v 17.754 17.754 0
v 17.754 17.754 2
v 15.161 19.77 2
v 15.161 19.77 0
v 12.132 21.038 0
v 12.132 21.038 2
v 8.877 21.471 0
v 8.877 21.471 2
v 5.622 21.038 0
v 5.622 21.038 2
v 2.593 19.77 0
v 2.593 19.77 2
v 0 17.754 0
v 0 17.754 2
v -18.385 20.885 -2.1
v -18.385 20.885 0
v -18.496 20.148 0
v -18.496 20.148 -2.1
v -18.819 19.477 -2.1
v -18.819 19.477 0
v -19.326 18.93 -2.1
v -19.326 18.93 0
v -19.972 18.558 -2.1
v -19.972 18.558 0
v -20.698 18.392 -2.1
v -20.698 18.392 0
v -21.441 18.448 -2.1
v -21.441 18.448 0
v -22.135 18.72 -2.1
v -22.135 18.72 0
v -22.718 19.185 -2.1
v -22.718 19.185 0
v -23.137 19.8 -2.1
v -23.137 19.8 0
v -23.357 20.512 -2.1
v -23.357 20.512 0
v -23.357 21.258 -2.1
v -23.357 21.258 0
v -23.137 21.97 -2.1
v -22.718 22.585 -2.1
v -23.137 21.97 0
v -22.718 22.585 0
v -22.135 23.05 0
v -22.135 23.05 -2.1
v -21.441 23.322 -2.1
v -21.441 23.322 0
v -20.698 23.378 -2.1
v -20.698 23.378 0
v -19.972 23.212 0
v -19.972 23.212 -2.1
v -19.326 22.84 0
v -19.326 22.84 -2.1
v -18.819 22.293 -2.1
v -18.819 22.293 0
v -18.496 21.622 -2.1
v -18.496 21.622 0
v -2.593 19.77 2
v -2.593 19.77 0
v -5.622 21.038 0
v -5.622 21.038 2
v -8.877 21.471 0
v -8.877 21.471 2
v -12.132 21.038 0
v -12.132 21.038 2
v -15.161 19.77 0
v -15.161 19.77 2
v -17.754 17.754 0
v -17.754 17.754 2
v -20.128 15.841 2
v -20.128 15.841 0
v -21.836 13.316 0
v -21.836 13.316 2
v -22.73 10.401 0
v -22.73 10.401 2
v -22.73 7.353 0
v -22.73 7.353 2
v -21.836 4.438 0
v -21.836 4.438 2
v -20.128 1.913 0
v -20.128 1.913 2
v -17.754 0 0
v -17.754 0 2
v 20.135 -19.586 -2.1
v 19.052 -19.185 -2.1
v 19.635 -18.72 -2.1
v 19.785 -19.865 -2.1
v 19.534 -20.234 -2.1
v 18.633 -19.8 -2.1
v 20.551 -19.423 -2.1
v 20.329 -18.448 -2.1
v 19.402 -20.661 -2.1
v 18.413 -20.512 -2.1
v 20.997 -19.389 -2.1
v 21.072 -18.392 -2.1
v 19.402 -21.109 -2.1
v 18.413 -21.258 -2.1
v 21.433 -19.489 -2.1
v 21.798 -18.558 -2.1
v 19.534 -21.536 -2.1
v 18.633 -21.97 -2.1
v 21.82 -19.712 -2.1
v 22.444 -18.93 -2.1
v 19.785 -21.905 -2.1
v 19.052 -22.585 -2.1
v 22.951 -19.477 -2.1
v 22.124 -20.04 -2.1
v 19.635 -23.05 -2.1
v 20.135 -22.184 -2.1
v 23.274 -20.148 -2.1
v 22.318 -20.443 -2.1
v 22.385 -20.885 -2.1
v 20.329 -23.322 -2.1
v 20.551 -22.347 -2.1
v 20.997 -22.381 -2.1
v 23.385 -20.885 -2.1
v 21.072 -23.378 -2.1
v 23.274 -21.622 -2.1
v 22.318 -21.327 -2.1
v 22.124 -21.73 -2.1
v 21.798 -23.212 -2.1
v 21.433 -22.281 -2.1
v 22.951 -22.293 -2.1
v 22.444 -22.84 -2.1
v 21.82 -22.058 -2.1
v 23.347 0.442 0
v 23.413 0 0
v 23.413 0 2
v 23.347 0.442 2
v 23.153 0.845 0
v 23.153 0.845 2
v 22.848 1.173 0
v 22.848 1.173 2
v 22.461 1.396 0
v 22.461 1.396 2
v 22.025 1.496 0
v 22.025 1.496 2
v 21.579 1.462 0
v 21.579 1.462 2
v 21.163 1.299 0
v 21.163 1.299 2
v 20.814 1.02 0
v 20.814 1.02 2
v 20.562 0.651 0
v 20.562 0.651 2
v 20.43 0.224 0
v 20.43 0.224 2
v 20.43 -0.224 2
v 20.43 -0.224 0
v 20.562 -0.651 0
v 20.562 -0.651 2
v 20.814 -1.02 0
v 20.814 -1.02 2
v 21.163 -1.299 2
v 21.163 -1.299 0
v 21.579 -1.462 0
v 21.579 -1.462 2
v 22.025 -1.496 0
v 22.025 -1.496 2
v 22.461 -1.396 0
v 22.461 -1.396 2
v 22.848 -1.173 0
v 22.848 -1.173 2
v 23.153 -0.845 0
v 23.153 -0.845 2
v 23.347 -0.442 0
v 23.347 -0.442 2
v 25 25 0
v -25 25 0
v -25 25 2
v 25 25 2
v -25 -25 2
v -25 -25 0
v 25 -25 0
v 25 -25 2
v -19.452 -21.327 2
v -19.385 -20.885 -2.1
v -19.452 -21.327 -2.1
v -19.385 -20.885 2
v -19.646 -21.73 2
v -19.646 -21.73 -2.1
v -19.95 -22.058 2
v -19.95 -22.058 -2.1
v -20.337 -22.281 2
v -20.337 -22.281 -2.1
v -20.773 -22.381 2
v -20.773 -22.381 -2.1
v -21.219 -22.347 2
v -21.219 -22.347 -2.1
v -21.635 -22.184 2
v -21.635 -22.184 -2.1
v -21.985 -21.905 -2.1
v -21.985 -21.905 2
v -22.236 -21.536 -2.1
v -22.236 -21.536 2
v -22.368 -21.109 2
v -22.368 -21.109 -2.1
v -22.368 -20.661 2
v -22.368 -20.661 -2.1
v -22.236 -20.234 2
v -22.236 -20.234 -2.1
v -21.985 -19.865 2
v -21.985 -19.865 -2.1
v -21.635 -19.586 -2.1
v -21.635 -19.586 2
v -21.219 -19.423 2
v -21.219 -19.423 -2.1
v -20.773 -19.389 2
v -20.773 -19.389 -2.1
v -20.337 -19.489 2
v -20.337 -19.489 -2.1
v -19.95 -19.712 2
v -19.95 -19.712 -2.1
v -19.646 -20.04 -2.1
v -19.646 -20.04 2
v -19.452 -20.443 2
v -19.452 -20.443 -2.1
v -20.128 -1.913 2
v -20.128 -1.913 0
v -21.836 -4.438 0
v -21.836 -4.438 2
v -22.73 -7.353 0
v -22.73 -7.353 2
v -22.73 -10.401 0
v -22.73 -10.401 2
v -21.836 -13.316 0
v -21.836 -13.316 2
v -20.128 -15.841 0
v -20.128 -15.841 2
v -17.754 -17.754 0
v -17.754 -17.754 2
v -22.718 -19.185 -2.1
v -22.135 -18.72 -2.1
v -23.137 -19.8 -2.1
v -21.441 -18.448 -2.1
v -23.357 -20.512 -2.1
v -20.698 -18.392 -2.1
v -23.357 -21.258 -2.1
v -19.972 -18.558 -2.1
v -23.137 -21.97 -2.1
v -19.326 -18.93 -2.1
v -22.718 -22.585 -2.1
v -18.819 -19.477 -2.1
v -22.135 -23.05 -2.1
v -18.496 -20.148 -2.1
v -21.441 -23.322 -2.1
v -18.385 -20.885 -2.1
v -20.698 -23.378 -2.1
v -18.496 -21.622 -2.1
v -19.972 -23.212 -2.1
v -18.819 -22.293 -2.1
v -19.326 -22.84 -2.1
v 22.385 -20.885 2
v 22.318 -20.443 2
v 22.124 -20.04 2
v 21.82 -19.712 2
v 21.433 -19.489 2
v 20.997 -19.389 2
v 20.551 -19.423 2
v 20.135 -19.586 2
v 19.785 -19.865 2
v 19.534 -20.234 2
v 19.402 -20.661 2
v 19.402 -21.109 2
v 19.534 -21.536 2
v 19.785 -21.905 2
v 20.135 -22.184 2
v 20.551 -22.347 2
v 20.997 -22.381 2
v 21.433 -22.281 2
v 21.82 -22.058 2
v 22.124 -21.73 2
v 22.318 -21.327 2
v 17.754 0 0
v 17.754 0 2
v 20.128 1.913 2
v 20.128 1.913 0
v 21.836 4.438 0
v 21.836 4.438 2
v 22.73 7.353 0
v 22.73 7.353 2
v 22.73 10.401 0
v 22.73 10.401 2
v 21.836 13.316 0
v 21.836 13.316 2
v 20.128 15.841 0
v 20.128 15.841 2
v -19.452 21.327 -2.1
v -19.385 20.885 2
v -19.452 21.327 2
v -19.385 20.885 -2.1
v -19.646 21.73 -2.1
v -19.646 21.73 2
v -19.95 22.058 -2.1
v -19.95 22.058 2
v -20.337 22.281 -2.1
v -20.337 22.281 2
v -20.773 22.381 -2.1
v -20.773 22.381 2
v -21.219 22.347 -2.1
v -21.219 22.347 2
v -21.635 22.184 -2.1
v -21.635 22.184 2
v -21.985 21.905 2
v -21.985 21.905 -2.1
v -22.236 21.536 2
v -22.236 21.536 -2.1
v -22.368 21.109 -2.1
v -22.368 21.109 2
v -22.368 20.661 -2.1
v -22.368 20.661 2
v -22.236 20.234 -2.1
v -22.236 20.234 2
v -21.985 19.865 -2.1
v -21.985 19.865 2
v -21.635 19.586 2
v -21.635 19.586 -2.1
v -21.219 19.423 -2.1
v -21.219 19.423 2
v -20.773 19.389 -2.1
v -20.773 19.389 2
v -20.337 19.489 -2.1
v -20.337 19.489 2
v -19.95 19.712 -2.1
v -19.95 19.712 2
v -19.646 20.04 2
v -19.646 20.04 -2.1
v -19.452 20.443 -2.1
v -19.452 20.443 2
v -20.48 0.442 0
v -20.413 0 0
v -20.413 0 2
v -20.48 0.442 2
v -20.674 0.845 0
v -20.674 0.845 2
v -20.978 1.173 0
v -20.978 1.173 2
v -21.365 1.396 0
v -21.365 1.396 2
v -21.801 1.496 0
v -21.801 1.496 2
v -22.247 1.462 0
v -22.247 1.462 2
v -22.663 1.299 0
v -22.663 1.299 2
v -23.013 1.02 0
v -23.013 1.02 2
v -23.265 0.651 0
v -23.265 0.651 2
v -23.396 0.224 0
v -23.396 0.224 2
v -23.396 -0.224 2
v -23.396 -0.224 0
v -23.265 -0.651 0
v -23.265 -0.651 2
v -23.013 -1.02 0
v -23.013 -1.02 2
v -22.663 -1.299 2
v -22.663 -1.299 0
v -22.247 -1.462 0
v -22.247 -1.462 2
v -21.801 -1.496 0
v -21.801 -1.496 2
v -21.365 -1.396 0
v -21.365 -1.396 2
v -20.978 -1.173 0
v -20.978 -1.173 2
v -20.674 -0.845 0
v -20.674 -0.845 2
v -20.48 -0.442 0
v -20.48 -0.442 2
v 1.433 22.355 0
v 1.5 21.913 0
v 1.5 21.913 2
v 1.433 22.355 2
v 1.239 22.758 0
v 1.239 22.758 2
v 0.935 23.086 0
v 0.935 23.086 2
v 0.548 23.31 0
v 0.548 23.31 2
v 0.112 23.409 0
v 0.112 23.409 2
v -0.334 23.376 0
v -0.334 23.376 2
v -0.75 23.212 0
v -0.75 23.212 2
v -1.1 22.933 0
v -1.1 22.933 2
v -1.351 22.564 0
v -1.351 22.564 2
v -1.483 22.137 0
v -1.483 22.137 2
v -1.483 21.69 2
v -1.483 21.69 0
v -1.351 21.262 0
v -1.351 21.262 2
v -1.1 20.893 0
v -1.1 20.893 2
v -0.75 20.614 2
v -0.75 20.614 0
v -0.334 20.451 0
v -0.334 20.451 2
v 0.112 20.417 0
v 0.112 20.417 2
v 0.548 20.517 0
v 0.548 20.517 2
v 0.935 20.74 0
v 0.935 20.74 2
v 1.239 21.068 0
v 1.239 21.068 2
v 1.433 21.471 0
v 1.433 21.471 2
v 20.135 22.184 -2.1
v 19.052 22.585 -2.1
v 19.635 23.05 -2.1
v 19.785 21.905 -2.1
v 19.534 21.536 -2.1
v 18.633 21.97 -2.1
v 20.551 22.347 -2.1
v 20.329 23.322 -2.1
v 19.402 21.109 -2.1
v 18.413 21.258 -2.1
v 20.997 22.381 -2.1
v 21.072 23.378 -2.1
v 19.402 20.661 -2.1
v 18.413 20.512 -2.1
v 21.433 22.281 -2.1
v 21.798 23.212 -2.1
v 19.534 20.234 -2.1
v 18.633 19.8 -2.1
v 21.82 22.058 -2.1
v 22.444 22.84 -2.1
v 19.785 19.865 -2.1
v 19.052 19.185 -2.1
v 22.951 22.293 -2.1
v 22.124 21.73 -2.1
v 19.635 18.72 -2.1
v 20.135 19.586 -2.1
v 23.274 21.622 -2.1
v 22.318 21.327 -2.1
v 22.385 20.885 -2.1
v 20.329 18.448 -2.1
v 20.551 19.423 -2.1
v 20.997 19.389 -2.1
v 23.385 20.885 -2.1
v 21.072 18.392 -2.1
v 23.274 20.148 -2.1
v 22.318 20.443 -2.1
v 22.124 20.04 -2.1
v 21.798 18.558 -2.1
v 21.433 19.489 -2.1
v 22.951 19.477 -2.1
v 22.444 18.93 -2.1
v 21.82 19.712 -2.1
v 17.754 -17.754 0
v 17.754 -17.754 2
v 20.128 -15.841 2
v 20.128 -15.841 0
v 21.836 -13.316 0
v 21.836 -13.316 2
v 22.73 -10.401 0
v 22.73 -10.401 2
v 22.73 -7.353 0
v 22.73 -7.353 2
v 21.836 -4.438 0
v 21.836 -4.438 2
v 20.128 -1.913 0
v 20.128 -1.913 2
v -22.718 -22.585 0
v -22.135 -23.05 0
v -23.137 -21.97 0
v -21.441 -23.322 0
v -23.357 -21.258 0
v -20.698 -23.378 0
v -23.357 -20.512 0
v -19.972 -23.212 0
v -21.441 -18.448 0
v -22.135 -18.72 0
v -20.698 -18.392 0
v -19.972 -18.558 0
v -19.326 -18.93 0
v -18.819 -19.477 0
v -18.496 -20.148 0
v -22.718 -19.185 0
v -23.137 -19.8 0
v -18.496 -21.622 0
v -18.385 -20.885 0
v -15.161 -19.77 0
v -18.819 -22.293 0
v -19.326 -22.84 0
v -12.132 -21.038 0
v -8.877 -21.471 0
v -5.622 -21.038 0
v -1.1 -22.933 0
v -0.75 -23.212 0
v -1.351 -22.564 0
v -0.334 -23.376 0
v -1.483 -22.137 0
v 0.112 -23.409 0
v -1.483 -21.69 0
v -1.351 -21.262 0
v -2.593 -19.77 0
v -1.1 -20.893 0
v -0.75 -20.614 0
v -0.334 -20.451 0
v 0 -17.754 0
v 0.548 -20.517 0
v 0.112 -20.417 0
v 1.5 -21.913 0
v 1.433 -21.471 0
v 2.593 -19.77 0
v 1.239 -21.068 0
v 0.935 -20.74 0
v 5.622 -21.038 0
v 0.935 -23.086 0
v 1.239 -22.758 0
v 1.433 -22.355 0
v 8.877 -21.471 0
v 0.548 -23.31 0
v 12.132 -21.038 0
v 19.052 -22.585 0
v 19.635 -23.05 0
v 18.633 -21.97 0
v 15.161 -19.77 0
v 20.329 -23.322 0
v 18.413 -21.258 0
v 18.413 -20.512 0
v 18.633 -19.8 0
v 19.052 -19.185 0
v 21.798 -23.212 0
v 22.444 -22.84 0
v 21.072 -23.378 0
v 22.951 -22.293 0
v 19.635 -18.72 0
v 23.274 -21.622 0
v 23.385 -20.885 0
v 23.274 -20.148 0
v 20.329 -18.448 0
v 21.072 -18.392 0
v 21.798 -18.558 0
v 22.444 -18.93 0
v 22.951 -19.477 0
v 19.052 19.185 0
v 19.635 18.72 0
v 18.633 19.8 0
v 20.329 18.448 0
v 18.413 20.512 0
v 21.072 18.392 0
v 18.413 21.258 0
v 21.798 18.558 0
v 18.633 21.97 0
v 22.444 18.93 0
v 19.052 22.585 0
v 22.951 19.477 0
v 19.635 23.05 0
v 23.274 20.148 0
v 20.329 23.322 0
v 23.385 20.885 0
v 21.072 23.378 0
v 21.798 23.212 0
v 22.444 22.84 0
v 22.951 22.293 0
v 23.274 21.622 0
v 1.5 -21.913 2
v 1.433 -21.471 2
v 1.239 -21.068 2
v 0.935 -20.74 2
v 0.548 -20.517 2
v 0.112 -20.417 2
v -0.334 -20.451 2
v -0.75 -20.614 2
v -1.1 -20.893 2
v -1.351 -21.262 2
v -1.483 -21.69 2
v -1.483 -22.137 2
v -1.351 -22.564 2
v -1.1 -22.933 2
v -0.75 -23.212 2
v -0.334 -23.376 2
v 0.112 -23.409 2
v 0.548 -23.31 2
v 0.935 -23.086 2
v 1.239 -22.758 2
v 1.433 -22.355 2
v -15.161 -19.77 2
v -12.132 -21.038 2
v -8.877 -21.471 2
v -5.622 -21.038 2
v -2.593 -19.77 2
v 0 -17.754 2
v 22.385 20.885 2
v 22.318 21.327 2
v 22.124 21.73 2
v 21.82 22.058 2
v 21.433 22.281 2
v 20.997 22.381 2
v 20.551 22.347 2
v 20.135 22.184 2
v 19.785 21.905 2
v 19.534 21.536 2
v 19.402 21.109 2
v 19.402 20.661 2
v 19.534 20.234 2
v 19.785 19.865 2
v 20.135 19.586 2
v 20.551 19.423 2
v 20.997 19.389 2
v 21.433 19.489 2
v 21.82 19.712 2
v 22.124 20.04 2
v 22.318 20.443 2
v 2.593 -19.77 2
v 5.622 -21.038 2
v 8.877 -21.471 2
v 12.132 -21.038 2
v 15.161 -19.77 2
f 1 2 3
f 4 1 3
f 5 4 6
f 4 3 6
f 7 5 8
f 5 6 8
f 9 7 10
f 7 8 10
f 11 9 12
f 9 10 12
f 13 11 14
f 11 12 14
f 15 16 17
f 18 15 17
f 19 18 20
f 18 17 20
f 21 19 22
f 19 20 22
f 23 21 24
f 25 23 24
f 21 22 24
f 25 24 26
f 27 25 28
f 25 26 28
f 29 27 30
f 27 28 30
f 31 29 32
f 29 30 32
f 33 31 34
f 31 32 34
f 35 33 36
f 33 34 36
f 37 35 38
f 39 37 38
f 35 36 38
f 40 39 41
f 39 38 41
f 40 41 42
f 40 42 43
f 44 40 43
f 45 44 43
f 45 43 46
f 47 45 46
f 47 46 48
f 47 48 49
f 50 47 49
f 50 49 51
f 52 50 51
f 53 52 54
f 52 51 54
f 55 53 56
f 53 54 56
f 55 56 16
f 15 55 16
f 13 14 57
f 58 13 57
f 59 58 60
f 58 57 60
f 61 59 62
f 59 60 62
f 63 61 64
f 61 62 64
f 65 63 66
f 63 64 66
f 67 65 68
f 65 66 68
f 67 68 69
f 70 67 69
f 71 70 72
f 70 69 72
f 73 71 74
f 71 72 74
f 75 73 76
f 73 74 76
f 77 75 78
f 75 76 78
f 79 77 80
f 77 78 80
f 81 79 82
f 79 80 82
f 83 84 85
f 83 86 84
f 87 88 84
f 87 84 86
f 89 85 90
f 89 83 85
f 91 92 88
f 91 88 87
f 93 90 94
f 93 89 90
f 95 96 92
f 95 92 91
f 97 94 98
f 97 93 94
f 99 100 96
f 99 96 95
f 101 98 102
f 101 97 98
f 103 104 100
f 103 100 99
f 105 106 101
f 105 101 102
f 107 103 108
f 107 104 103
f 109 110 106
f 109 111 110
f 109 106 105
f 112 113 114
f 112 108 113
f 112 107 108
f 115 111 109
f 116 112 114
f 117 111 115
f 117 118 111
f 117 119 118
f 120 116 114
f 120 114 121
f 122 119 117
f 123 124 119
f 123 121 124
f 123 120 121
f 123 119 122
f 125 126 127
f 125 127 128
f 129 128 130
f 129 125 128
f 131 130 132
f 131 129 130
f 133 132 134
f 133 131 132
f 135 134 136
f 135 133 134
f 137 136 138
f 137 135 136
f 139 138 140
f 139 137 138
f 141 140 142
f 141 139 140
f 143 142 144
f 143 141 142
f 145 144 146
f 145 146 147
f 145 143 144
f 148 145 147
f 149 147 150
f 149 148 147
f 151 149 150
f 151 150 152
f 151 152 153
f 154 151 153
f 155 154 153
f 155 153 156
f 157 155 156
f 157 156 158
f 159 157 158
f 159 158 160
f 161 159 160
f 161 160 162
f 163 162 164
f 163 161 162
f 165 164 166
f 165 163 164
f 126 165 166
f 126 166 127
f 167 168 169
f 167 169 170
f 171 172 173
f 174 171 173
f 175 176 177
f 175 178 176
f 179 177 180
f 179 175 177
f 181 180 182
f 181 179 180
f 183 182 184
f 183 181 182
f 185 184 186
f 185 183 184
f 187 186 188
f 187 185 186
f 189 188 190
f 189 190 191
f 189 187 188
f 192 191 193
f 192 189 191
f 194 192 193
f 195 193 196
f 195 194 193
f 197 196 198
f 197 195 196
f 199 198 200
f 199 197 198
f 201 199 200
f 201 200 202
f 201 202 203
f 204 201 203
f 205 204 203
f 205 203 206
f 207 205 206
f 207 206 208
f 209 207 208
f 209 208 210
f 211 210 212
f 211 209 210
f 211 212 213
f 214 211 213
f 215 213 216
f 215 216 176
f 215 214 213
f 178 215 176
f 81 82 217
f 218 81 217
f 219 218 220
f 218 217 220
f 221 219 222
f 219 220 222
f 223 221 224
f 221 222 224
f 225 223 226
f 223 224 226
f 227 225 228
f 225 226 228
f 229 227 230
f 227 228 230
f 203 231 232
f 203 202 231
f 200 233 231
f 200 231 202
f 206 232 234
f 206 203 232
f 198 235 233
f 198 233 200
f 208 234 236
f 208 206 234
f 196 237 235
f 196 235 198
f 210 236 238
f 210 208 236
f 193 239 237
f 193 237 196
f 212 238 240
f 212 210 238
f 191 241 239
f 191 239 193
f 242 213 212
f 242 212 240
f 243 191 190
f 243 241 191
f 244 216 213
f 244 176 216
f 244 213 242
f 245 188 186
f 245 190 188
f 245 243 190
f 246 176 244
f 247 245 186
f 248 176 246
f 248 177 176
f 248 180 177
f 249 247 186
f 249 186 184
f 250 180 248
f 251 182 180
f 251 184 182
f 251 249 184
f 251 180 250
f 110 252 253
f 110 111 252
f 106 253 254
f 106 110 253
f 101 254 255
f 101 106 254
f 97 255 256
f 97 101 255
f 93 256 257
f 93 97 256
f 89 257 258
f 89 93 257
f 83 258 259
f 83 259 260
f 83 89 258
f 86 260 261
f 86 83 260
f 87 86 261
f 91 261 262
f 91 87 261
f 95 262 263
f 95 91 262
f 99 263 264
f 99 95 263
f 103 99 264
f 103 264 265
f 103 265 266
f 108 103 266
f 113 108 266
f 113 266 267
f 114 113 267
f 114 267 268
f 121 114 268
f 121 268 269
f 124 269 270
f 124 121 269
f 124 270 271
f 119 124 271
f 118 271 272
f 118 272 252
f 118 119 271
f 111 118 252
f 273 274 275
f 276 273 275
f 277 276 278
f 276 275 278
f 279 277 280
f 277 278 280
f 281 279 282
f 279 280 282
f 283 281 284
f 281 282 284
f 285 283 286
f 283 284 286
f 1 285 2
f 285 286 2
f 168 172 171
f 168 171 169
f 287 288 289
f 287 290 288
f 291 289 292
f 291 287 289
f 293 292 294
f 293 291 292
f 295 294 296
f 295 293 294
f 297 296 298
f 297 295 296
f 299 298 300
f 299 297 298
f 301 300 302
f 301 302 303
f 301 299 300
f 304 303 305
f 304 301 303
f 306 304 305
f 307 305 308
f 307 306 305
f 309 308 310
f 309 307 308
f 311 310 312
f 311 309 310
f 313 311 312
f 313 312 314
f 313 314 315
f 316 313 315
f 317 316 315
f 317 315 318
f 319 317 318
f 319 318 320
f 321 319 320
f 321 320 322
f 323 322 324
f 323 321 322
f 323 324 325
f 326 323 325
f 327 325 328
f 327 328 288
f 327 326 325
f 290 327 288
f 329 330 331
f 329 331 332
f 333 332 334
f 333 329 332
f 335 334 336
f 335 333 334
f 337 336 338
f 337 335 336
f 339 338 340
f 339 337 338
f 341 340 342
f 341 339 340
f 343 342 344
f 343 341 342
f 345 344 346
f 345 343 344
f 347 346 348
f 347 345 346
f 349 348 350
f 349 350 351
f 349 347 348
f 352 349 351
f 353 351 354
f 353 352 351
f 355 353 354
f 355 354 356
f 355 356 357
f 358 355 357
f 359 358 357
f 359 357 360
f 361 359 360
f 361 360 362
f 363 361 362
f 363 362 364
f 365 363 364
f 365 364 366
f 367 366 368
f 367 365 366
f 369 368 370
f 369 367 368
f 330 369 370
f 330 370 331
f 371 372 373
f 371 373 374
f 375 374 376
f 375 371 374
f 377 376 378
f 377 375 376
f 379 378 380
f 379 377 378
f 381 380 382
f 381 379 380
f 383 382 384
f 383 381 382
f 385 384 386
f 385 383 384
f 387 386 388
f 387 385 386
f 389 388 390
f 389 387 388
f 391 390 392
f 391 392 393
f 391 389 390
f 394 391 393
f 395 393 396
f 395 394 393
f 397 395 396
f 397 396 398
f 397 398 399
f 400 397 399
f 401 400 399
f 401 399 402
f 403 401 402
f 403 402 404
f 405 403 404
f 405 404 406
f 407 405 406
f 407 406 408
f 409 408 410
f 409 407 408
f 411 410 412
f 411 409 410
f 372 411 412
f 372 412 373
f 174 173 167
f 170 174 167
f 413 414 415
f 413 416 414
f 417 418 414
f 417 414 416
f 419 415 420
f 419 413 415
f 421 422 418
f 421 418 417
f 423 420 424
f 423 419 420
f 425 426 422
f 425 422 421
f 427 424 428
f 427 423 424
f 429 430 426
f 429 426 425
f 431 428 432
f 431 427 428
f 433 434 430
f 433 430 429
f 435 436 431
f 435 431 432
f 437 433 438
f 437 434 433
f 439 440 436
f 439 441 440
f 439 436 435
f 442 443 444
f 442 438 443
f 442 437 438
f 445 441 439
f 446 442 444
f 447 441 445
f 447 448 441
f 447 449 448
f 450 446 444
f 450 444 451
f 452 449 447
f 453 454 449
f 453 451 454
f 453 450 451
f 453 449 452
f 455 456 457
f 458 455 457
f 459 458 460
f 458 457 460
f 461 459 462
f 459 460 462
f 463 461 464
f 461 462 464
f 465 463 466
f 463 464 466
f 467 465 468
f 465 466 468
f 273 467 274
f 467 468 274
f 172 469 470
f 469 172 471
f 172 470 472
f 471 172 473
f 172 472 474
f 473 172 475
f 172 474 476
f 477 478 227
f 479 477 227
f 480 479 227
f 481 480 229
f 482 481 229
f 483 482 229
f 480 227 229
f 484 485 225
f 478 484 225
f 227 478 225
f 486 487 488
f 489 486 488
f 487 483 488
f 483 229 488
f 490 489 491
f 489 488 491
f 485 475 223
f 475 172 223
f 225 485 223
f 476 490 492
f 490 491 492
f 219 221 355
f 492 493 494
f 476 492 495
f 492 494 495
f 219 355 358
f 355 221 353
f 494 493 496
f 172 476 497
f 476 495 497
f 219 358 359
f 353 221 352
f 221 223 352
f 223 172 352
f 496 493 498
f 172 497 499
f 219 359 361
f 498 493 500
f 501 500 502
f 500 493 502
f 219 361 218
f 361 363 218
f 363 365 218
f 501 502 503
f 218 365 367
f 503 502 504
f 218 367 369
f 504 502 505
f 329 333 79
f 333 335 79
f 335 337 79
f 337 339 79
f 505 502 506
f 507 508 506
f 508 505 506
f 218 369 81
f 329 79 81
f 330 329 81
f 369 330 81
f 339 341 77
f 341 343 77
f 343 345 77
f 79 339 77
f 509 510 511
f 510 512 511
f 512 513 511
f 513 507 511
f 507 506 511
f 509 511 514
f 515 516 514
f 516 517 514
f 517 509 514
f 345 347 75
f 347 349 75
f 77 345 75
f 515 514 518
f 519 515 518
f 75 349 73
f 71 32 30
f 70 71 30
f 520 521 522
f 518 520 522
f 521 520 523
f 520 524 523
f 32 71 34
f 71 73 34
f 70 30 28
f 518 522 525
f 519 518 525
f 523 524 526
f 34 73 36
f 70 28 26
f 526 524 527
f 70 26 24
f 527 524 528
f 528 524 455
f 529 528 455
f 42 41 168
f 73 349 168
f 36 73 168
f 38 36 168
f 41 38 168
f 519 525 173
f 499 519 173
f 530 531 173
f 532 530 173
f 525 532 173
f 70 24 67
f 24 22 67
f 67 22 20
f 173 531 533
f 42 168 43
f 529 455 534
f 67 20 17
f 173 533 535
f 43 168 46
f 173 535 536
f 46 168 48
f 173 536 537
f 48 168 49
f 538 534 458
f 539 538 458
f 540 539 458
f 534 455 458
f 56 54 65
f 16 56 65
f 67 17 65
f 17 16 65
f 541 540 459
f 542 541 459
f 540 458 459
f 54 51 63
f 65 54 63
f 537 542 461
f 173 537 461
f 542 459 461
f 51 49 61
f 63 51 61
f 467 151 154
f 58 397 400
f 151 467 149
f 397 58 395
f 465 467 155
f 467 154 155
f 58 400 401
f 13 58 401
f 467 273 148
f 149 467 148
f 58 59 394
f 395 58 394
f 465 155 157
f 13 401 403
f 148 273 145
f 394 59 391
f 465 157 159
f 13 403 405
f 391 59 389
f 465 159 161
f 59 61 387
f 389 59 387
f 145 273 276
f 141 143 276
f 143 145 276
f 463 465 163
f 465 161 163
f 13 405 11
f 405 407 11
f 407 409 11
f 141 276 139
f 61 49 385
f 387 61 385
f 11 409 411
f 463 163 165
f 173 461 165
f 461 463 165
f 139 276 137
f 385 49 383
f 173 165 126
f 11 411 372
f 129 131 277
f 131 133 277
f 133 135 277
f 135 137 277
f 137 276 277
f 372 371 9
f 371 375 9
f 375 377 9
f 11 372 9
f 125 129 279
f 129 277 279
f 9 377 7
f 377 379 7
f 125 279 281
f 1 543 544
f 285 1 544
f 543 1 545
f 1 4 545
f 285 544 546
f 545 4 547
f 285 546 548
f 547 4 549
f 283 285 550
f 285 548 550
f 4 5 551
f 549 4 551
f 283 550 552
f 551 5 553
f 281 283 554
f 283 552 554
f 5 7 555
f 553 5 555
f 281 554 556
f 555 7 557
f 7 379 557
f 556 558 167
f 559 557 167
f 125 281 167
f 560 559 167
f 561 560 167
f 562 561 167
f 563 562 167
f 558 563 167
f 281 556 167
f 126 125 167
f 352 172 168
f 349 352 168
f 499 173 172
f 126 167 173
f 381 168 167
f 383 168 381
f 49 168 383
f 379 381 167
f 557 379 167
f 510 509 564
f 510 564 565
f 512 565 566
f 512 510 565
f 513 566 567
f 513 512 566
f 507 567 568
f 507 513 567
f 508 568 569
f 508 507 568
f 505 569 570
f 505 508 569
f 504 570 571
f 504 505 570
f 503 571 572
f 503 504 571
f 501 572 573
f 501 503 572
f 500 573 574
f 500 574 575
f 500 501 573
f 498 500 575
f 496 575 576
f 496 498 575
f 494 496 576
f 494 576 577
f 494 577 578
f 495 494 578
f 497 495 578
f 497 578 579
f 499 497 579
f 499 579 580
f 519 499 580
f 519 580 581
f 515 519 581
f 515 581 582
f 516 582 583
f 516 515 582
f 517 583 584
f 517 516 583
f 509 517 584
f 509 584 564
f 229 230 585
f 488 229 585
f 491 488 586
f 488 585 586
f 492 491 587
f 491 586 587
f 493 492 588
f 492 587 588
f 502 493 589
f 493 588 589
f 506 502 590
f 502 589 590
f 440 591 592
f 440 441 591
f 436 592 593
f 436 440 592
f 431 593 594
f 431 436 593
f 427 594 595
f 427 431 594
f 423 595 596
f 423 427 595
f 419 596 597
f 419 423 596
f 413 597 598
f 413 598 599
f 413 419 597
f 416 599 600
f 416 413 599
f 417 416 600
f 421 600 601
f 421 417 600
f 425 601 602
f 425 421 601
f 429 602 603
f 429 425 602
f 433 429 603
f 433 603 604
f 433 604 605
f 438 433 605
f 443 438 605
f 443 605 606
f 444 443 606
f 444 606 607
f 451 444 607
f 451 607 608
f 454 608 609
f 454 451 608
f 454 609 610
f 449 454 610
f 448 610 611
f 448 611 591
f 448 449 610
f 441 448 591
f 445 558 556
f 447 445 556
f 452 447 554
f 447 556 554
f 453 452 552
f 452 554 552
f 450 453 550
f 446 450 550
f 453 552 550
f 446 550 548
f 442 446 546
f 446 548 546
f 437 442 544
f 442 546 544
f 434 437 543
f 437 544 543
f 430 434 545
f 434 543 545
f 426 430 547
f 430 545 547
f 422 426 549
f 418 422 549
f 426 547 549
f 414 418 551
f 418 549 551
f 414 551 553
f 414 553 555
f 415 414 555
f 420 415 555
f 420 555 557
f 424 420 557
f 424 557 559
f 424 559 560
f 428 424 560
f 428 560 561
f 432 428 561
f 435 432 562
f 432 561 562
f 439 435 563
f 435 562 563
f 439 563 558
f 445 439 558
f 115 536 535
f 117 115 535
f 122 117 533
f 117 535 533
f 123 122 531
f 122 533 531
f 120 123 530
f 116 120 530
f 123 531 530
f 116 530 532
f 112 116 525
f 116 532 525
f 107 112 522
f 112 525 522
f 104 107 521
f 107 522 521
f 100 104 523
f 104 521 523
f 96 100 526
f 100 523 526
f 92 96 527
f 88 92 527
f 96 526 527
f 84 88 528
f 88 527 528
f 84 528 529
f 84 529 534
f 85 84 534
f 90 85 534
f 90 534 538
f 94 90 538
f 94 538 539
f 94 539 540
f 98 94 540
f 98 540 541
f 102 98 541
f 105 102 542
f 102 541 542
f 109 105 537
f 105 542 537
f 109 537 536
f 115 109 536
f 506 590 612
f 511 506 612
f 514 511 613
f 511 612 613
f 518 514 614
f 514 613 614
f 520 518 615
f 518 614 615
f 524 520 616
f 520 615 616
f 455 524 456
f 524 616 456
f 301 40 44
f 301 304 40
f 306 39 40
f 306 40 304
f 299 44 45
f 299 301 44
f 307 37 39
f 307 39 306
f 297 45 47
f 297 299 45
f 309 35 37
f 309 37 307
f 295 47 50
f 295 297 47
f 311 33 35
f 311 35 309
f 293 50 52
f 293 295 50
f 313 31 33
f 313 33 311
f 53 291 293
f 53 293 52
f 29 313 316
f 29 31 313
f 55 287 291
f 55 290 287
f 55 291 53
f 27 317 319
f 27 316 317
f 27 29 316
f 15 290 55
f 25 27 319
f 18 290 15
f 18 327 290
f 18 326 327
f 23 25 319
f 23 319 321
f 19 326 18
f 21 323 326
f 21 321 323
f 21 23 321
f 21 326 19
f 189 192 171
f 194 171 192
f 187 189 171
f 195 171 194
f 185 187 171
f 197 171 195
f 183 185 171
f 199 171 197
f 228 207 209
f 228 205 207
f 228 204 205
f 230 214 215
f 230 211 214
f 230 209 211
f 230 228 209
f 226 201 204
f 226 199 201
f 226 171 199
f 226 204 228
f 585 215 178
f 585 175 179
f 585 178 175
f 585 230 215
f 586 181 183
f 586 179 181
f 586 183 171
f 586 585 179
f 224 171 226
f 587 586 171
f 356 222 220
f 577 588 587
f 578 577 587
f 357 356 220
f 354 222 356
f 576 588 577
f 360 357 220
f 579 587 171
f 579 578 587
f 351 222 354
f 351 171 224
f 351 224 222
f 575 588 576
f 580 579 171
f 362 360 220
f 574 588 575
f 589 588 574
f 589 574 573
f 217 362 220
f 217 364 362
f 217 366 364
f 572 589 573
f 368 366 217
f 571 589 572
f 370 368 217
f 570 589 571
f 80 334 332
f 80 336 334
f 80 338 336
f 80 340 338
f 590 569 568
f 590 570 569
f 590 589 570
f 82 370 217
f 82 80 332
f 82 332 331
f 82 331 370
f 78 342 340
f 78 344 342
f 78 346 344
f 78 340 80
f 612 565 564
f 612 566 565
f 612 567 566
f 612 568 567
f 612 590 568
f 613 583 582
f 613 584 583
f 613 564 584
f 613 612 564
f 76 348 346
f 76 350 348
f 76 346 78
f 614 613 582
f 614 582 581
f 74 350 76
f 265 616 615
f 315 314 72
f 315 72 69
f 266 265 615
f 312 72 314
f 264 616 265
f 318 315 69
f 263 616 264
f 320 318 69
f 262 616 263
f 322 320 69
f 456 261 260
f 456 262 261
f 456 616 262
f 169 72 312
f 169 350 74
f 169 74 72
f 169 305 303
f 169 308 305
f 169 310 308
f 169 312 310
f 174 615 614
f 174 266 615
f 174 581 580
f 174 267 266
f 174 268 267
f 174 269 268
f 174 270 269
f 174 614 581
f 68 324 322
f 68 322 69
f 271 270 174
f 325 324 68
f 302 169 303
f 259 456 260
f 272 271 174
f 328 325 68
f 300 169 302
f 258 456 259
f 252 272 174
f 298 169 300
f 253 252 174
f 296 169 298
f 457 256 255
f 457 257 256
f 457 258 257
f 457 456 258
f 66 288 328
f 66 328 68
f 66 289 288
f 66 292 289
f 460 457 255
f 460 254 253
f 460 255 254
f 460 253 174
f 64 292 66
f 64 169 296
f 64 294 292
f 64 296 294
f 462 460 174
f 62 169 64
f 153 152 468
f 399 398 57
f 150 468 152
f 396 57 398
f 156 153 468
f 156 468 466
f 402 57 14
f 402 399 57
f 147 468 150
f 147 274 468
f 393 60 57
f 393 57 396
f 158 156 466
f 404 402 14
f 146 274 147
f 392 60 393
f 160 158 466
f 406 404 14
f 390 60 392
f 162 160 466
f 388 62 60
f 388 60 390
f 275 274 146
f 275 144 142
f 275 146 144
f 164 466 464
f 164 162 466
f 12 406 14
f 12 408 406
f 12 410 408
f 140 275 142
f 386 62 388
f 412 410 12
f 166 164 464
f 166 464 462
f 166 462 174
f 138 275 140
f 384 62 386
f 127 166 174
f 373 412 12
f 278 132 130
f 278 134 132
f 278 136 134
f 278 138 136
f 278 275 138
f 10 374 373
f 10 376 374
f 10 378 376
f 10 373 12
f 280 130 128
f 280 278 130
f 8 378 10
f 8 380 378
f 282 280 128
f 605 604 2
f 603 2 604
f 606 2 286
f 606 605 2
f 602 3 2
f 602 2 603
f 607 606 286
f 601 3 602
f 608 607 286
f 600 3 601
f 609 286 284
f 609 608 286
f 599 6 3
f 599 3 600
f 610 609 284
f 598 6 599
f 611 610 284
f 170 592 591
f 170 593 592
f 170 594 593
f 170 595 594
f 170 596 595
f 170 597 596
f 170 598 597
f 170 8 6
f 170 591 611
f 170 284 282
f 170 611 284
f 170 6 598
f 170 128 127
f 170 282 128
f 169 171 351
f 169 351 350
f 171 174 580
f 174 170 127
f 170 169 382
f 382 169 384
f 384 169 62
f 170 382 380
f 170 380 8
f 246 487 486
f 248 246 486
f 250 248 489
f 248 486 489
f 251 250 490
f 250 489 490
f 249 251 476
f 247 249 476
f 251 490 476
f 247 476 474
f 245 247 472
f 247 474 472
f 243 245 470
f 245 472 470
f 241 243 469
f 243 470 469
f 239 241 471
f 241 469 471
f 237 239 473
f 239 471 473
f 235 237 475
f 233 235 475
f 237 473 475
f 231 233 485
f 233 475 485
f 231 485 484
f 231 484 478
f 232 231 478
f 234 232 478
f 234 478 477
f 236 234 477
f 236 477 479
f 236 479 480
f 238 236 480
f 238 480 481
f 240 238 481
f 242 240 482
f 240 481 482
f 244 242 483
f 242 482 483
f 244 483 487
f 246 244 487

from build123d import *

# Parameters (mm, degrees)
F0_W     = 50
F0_H     = 50
F0_R     = 1.5
F1_DEPTH = 2
F3_DEPTH = 25
F4_R     = 2.5
F4_R_2   = 1.5
F5_DEPTH = 2.1


with BuildPart() as f1:
    # F0 (on Top) → F1 (new body)
    with BuildSketch(Plane.XY):
        Rectangle(F0_W, F0_H)
        with Locations((-20.885, -20.885)):
            Circle(F0_R, mode=Mode.SUBTRACT)
        with Locations((0, -21.913239149)):
            Circle(F0_R, mode=Mode.SUBTRACT)
        with Locations((20.885, -20.885)):
            Circle(F0_R, mode=Mode.SUBTRACT)
        with Locations((-21.913239149, 0)):
            Circle(F0_R, mode=Mode.SUBTRACT)
        with Locations((-20.885, 20.885)):
            Circle(F0_R, mode=Mode.SUBTRACT)
        with Locations((21.913239149, 0)):
            Circle(F0_R, mode=Mode.SUBTRACT)
        with Locations((0, 21.913239149)):
            Circle(F0_R, mode=Mode.SUBTRACT)
        with Locations((20.885, 20.885)):
            Circle(F0_R, mode=Mode.SUBTRACT)
    extrude(amount=F1_DEPTH)

    # F2 (on face) → F3 (cut)
    with BuildSketch(Plane.XY.offset(2)):
        with BuildLine():
            ThreePointArc((0, 17.7539922297), (-8.8769961149, 21.470552283), (-17.7539922297, 17.7539922297))
            ThreePointArc((-17.7539922297, 17.7539922297), (-22.8434548265, 8.8769961149), (-17.7539922297, 0))
            ThreePointArc((-17.7539922297, 0), (-22.8434548265, -8.8769961149), (-17.7539922297, -17.7539922297))
            ThreePointArc((-17.7539922297, -17.7539922297), (-8.8769961149, -21.470552283), (0, -17.7539922297))
            ThreePointArc((0, -17.7539922297), (8.8769961149, -21.470552283), (17.7539922297, -17.7539922297))
            ThreePointArc((17.7539922297, -17.7539922297), (22.8434548265, -8.8769961149), (17.7539922297, 0))
            ThreePointArc((17.7539922297, 0), (22.8434548265, 8.8769961149), (17.7539922297, 17.7539922297))
            ThreePointArc((17.7539922297, 17.7539922297), (8.8769961149, 21.470552283), (0, 17.7539922297))
        make_face()
    extrude(amount=-F3_DEPTH, mode=Mode.SUBTRACT)

    # F4 (on face) → F5 (join)
    with BuildSketch(Plane(origin=(0, 0, 0), x_dir=(1, 0, 0), z_dir=(0, 0, -1))):
        with Locations((-20.885, 20.885)):
            Circle(F4_R)
        with Locations((-20.885, 20.885)):
            Circle(F4_R_2, mode=Mode.SUBTRACT)
        with Locations((20.885, 20.885)):
            Circle(F4_R)
        with Locations((20.885, 20.885)):
            Circle(F4_R_2, mode=Mode.SUBTRACT)
        with Locations((20.885, -20.885)):
            Circle(F4_R)
        with Locations((20.885, -20.885)):
            Circle(F4_R_2, mode=Mode.SUBTRACT)
        with Locations((-20.885, -20.885)):
            Circle(F4_R)
        with Locations((-20.885, -20.885)):
            Circle(F4_R_2, mode=Mode.SUBTRACT)
    extrude(amount=F5_DEPTH)


solid = f1.part
